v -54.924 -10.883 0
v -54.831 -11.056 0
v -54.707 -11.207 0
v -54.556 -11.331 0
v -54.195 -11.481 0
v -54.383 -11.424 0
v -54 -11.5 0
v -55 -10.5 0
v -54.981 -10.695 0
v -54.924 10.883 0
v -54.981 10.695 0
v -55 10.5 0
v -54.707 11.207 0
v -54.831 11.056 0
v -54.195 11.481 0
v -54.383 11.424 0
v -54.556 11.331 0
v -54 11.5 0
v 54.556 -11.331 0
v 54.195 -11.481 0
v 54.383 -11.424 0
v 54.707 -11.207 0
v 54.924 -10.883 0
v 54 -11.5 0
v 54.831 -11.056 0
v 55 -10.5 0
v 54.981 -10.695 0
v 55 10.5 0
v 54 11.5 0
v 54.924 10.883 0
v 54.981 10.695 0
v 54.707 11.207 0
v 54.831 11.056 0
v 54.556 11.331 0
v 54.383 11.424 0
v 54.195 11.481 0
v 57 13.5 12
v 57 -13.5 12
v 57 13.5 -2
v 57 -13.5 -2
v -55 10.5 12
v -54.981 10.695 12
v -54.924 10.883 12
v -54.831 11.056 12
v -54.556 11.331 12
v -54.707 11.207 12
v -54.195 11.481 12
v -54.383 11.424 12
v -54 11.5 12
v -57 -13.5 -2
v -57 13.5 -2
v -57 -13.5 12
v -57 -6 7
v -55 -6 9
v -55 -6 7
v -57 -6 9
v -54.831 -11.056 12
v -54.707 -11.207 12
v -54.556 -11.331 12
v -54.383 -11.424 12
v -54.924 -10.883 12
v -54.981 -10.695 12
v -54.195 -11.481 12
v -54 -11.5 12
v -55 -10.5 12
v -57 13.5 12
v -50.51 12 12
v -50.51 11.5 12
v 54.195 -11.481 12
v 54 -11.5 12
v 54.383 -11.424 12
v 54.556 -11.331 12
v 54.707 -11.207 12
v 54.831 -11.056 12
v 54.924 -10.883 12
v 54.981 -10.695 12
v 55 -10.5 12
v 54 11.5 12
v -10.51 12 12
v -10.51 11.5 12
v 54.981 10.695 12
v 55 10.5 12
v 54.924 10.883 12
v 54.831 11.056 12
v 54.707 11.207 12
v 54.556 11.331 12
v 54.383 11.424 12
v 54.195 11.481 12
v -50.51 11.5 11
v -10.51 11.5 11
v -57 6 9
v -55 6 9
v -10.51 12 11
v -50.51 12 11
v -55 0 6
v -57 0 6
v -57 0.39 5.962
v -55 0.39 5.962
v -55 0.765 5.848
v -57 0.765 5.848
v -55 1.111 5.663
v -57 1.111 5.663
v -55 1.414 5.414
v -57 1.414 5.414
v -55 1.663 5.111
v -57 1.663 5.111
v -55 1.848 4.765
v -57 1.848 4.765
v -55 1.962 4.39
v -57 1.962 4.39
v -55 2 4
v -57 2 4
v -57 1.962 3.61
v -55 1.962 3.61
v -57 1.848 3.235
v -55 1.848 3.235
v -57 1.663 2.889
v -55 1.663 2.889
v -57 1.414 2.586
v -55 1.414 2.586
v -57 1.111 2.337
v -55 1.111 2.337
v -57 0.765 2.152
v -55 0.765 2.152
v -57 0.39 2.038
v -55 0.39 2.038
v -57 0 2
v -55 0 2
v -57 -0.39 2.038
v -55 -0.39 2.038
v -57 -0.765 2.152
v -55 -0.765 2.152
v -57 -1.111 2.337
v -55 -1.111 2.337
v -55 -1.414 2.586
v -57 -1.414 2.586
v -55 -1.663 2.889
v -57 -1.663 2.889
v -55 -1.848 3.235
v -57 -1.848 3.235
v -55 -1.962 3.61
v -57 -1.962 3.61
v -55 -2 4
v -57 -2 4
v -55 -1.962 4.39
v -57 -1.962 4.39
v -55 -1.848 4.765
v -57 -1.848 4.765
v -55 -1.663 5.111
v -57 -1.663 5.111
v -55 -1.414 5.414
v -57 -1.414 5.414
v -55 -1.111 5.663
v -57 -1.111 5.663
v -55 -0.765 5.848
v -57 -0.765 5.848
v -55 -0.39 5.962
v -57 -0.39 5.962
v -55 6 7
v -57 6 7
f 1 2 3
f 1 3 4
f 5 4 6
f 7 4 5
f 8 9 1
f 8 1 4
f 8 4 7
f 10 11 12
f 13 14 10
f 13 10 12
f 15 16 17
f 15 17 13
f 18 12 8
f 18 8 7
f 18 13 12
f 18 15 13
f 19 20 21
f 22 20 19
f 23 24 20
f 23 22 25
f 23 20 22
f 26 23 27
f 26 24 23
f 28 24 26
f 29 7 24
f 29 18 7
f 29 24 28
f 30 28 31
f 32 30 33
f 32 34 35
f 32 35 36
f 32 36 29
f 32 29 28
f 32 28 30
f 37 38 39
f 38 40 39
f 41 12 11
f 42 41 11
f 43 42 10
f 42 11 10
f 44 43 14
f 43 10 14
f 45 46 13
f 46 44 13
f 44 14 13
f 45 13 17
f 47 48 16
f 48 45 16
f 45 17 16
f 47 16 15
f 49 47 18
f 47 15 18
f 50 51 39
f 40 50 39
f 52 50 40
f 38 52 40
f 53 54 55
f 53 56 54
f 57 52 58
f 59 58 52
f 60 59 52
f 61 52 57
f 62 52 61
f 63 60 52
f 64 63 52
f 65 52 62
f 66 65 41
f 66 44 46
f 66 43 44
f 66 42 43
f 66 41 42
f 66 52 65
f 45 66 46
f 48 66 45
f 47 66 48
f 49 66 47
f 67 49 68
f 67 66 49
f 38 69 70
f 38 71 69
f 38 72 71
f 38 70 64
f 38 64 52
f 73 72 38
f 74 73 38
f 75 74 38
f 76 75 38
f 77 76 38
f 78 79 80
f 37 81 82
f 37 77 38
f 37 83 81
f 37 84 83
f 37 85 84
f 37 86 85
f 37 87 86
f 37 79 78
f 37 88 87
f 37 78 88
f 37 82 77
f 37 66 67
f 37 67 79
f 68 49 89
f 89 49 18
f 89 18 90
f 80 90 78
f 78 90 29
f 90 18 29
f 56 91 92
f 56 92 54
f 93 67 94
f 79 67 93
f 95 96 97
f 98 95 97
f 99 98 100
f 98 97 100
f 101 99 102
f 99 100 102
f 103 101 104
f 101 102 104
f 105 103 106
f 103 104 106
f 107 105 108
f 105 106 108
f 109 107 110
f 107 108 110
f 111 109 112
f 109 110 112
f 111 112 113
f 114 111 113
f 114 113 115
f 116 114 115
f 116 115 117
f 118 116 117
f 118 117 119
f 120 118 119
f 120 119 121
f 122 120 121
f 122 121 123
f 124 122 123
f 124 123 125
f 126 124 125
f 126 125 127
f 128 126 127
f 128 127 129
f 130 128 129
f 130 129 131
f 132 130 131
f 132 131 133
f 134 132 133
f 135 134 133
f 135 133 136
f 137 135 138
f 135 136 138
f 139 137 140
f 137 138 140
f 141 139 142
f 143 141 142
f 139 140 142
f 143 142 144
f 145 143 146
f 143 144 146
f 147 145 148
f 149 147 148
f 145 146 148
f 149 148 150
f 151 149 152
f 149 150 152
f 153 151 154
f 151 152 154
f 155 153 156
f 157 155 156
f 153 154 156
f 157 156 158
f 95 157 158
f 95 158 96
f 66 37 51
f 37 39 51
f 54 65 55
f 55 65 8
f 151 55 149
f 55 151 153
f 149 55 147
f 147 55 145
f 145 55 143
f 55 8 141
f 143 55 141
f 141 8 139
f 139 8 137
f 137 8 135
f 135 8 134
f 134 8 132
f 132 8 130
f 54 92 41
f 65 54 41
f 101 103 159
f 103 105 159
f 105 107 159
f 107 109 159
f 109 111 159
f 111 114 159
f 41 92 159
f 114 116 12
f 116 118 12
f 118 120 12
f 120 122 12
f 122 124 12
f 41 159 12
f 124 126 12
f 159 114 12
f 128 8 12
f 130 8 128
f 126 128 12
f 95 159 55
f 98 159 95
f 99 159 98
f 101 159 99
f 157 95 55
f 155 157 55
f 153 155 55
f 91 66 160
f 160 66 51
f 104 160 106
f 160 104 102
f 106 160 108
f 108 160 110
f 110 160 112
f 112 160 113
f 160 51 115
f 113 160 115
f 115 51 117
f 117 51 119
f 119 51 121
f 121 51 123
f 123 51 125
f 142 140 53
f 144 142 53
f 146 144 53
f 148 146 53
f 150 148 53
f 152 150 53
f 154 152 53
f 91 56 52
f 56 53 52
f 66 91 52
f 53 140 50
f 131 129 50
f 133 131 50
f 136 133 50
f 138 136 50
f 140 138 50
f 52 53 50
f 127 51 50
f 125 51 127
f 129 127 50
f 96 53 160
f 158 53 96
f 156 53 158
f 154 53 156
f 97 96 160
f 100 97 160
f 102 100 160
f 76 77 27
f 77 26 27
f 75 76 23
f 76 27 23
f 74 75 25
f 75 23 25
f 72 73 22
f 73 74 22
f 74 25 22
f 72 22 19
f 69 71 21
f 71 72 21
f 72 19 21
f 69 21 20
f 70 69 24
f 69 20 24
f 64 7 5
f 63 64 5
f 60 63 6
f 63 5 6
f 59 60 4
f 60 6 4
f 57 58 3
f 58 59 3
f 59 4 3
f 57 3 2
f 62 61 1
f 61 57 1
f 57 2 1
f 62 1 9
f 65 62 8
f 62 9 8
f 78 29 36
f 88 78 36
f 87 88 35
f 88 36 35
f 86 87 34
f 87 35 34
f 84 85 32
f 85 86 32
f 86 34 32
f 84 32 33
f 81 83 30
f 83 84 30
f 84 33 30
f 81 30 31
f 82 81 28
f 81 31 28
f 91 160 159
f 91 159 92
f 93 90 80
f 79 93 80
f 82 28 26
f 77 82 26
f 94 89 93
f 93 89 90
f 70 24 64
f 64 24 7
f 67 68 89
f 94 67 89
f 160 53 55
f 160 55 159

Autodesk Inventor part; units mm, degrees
ref_plane "YZ Plane" through (0, 0, 0) normal (1, 0, 0) x (0, 1, 0)
ref_plane "XZ Plane" through (0, 0, 0) normal (0, 1, 0) x (-1, 0, 0)
ref_plane "XY Plane" through (0, 0, 0) normal (0, 0, 1) x (1, 0, 0)
sketch "Sketch2" plane through (0, 0, 0) normal (0, 0, 1) x (1, 0, 0)
  line L0 (-54, 11.5) -> (54, 11.5)
  line L1 (55, 10.5) -> (55, -10.5)
  line L2 (54, -11.5) -> (-54, -11.5)
  line L3 (-55, -10.5) -> (-55, 10.5)
  line L4 (-55, 11.5) -> (55, -11.5) construction
  line L5 (55, 11.5) -> (-55, -11.5) construction
  line L6 (53, 9.5) -> (-53, 9.5)
  line L7 (-53, 9.5) -> (-53, -9.5)
  line L8 (-53, -9.5) -> (53, -9.5)
  line L9 (53, -9.5) -> (53, 9.5)
  line L10 (57, 13.5) -> (-57, 13.5)
  line L11 (-57, 13.5) -> (-57, -13.5)
  line L12 (-57, -13.5) -> (57, -13.5)
  line L13 (57, -13.5) -> (57, 13.5)
  arc A0 (55, 10.5) -> (54, 11.5) centre (54, 10.5) ccw
  arc A1 (54, -11.5) -> (55, -10.5) centre (54, -10.5) ccw
  arc A2 (-55, -10.5) -> (-54, -11.5) centre (-54, -10.5) ccw
  arc A3 (-54, 11.5) -> (-55, 10.5) centre (-54, 10.5) ccw
  point P0 (0, 0)
  dimension "d0" = 110
  dimension "d1" = 23
  dimension "d2" = 2
  dimension "d3" = 2
  dimension "d10" = 1
extrude "Extrusion2" add sketch "Sketch2" along normal blind 12 contours L13 L12 L11 L10
sketch "Sketch3" plane through (-57, -13.5, 0) normal (-1, 0, 0) x (0, 0, 1)
  line L0 (7, 19.5) -> (9, 19.5)
  line L1 (9, 19.5) -> (9, 7.5)
  line L2 (9, 7.5) -> (7, 7.5)
  line L3 (7, 7.5) -> (7, 19.5)
  line L4 (0, 27) -> (0, 0) projected
  line L5 (0, 27) -> (12, 27) projected
  circle A0 centre (4, 13.5) radius 2
  line L6 (12, 27) -> (12, 0) projected
  line L7 (0, 13.5) -> (2, 13.5) construction
  line L8 (12, 0) -> (12, 27) construction
  line L9 (0, 0) -> (0, 27) construction
  dimension "d20" = 4
  dimension "d12" = 2
  dimension "d13" = 12
  dimension "d15" = 7.5
  dimension "d21" = 3
  dimension "d24" = 4
  dimension "d25" = 2
  dimension "d26" = 3
extrude "Extrusion4" cut sketch "Sketch3" against normal blind 10
extrude "Extrusion5" add sketch "Sketch2" against normal blind 2 contours L0 A0 L1 A1 L2 A2 L3 A3 | L9 L8 L7 L6 | L13 L12 L11 L10
sketch "Sketch4" plane through (-54, 11.5, 12) normal (0, -1, 0) x (1, 0, 0)
  line L0 (3.4899, -1) -> (43.4899, -1)
  line L1 (43.4899, -1) -> (43.4899, 0)
  line L2 (43.4899, 0) -> (3.4899, 0)
  line L3 (3.4899, 0) -> (3.4899, -1)
  line L4 (0, 0) -> (108, 0) projected
  point P0 (54, -12)
  dimension "d27" = 1
  dimension "d28" = 40
extrude "Extrusion6" cut sketch "Sketch4" against normal blind 0.5
properties part number "sdm_finger_bone_attachment_mould"
